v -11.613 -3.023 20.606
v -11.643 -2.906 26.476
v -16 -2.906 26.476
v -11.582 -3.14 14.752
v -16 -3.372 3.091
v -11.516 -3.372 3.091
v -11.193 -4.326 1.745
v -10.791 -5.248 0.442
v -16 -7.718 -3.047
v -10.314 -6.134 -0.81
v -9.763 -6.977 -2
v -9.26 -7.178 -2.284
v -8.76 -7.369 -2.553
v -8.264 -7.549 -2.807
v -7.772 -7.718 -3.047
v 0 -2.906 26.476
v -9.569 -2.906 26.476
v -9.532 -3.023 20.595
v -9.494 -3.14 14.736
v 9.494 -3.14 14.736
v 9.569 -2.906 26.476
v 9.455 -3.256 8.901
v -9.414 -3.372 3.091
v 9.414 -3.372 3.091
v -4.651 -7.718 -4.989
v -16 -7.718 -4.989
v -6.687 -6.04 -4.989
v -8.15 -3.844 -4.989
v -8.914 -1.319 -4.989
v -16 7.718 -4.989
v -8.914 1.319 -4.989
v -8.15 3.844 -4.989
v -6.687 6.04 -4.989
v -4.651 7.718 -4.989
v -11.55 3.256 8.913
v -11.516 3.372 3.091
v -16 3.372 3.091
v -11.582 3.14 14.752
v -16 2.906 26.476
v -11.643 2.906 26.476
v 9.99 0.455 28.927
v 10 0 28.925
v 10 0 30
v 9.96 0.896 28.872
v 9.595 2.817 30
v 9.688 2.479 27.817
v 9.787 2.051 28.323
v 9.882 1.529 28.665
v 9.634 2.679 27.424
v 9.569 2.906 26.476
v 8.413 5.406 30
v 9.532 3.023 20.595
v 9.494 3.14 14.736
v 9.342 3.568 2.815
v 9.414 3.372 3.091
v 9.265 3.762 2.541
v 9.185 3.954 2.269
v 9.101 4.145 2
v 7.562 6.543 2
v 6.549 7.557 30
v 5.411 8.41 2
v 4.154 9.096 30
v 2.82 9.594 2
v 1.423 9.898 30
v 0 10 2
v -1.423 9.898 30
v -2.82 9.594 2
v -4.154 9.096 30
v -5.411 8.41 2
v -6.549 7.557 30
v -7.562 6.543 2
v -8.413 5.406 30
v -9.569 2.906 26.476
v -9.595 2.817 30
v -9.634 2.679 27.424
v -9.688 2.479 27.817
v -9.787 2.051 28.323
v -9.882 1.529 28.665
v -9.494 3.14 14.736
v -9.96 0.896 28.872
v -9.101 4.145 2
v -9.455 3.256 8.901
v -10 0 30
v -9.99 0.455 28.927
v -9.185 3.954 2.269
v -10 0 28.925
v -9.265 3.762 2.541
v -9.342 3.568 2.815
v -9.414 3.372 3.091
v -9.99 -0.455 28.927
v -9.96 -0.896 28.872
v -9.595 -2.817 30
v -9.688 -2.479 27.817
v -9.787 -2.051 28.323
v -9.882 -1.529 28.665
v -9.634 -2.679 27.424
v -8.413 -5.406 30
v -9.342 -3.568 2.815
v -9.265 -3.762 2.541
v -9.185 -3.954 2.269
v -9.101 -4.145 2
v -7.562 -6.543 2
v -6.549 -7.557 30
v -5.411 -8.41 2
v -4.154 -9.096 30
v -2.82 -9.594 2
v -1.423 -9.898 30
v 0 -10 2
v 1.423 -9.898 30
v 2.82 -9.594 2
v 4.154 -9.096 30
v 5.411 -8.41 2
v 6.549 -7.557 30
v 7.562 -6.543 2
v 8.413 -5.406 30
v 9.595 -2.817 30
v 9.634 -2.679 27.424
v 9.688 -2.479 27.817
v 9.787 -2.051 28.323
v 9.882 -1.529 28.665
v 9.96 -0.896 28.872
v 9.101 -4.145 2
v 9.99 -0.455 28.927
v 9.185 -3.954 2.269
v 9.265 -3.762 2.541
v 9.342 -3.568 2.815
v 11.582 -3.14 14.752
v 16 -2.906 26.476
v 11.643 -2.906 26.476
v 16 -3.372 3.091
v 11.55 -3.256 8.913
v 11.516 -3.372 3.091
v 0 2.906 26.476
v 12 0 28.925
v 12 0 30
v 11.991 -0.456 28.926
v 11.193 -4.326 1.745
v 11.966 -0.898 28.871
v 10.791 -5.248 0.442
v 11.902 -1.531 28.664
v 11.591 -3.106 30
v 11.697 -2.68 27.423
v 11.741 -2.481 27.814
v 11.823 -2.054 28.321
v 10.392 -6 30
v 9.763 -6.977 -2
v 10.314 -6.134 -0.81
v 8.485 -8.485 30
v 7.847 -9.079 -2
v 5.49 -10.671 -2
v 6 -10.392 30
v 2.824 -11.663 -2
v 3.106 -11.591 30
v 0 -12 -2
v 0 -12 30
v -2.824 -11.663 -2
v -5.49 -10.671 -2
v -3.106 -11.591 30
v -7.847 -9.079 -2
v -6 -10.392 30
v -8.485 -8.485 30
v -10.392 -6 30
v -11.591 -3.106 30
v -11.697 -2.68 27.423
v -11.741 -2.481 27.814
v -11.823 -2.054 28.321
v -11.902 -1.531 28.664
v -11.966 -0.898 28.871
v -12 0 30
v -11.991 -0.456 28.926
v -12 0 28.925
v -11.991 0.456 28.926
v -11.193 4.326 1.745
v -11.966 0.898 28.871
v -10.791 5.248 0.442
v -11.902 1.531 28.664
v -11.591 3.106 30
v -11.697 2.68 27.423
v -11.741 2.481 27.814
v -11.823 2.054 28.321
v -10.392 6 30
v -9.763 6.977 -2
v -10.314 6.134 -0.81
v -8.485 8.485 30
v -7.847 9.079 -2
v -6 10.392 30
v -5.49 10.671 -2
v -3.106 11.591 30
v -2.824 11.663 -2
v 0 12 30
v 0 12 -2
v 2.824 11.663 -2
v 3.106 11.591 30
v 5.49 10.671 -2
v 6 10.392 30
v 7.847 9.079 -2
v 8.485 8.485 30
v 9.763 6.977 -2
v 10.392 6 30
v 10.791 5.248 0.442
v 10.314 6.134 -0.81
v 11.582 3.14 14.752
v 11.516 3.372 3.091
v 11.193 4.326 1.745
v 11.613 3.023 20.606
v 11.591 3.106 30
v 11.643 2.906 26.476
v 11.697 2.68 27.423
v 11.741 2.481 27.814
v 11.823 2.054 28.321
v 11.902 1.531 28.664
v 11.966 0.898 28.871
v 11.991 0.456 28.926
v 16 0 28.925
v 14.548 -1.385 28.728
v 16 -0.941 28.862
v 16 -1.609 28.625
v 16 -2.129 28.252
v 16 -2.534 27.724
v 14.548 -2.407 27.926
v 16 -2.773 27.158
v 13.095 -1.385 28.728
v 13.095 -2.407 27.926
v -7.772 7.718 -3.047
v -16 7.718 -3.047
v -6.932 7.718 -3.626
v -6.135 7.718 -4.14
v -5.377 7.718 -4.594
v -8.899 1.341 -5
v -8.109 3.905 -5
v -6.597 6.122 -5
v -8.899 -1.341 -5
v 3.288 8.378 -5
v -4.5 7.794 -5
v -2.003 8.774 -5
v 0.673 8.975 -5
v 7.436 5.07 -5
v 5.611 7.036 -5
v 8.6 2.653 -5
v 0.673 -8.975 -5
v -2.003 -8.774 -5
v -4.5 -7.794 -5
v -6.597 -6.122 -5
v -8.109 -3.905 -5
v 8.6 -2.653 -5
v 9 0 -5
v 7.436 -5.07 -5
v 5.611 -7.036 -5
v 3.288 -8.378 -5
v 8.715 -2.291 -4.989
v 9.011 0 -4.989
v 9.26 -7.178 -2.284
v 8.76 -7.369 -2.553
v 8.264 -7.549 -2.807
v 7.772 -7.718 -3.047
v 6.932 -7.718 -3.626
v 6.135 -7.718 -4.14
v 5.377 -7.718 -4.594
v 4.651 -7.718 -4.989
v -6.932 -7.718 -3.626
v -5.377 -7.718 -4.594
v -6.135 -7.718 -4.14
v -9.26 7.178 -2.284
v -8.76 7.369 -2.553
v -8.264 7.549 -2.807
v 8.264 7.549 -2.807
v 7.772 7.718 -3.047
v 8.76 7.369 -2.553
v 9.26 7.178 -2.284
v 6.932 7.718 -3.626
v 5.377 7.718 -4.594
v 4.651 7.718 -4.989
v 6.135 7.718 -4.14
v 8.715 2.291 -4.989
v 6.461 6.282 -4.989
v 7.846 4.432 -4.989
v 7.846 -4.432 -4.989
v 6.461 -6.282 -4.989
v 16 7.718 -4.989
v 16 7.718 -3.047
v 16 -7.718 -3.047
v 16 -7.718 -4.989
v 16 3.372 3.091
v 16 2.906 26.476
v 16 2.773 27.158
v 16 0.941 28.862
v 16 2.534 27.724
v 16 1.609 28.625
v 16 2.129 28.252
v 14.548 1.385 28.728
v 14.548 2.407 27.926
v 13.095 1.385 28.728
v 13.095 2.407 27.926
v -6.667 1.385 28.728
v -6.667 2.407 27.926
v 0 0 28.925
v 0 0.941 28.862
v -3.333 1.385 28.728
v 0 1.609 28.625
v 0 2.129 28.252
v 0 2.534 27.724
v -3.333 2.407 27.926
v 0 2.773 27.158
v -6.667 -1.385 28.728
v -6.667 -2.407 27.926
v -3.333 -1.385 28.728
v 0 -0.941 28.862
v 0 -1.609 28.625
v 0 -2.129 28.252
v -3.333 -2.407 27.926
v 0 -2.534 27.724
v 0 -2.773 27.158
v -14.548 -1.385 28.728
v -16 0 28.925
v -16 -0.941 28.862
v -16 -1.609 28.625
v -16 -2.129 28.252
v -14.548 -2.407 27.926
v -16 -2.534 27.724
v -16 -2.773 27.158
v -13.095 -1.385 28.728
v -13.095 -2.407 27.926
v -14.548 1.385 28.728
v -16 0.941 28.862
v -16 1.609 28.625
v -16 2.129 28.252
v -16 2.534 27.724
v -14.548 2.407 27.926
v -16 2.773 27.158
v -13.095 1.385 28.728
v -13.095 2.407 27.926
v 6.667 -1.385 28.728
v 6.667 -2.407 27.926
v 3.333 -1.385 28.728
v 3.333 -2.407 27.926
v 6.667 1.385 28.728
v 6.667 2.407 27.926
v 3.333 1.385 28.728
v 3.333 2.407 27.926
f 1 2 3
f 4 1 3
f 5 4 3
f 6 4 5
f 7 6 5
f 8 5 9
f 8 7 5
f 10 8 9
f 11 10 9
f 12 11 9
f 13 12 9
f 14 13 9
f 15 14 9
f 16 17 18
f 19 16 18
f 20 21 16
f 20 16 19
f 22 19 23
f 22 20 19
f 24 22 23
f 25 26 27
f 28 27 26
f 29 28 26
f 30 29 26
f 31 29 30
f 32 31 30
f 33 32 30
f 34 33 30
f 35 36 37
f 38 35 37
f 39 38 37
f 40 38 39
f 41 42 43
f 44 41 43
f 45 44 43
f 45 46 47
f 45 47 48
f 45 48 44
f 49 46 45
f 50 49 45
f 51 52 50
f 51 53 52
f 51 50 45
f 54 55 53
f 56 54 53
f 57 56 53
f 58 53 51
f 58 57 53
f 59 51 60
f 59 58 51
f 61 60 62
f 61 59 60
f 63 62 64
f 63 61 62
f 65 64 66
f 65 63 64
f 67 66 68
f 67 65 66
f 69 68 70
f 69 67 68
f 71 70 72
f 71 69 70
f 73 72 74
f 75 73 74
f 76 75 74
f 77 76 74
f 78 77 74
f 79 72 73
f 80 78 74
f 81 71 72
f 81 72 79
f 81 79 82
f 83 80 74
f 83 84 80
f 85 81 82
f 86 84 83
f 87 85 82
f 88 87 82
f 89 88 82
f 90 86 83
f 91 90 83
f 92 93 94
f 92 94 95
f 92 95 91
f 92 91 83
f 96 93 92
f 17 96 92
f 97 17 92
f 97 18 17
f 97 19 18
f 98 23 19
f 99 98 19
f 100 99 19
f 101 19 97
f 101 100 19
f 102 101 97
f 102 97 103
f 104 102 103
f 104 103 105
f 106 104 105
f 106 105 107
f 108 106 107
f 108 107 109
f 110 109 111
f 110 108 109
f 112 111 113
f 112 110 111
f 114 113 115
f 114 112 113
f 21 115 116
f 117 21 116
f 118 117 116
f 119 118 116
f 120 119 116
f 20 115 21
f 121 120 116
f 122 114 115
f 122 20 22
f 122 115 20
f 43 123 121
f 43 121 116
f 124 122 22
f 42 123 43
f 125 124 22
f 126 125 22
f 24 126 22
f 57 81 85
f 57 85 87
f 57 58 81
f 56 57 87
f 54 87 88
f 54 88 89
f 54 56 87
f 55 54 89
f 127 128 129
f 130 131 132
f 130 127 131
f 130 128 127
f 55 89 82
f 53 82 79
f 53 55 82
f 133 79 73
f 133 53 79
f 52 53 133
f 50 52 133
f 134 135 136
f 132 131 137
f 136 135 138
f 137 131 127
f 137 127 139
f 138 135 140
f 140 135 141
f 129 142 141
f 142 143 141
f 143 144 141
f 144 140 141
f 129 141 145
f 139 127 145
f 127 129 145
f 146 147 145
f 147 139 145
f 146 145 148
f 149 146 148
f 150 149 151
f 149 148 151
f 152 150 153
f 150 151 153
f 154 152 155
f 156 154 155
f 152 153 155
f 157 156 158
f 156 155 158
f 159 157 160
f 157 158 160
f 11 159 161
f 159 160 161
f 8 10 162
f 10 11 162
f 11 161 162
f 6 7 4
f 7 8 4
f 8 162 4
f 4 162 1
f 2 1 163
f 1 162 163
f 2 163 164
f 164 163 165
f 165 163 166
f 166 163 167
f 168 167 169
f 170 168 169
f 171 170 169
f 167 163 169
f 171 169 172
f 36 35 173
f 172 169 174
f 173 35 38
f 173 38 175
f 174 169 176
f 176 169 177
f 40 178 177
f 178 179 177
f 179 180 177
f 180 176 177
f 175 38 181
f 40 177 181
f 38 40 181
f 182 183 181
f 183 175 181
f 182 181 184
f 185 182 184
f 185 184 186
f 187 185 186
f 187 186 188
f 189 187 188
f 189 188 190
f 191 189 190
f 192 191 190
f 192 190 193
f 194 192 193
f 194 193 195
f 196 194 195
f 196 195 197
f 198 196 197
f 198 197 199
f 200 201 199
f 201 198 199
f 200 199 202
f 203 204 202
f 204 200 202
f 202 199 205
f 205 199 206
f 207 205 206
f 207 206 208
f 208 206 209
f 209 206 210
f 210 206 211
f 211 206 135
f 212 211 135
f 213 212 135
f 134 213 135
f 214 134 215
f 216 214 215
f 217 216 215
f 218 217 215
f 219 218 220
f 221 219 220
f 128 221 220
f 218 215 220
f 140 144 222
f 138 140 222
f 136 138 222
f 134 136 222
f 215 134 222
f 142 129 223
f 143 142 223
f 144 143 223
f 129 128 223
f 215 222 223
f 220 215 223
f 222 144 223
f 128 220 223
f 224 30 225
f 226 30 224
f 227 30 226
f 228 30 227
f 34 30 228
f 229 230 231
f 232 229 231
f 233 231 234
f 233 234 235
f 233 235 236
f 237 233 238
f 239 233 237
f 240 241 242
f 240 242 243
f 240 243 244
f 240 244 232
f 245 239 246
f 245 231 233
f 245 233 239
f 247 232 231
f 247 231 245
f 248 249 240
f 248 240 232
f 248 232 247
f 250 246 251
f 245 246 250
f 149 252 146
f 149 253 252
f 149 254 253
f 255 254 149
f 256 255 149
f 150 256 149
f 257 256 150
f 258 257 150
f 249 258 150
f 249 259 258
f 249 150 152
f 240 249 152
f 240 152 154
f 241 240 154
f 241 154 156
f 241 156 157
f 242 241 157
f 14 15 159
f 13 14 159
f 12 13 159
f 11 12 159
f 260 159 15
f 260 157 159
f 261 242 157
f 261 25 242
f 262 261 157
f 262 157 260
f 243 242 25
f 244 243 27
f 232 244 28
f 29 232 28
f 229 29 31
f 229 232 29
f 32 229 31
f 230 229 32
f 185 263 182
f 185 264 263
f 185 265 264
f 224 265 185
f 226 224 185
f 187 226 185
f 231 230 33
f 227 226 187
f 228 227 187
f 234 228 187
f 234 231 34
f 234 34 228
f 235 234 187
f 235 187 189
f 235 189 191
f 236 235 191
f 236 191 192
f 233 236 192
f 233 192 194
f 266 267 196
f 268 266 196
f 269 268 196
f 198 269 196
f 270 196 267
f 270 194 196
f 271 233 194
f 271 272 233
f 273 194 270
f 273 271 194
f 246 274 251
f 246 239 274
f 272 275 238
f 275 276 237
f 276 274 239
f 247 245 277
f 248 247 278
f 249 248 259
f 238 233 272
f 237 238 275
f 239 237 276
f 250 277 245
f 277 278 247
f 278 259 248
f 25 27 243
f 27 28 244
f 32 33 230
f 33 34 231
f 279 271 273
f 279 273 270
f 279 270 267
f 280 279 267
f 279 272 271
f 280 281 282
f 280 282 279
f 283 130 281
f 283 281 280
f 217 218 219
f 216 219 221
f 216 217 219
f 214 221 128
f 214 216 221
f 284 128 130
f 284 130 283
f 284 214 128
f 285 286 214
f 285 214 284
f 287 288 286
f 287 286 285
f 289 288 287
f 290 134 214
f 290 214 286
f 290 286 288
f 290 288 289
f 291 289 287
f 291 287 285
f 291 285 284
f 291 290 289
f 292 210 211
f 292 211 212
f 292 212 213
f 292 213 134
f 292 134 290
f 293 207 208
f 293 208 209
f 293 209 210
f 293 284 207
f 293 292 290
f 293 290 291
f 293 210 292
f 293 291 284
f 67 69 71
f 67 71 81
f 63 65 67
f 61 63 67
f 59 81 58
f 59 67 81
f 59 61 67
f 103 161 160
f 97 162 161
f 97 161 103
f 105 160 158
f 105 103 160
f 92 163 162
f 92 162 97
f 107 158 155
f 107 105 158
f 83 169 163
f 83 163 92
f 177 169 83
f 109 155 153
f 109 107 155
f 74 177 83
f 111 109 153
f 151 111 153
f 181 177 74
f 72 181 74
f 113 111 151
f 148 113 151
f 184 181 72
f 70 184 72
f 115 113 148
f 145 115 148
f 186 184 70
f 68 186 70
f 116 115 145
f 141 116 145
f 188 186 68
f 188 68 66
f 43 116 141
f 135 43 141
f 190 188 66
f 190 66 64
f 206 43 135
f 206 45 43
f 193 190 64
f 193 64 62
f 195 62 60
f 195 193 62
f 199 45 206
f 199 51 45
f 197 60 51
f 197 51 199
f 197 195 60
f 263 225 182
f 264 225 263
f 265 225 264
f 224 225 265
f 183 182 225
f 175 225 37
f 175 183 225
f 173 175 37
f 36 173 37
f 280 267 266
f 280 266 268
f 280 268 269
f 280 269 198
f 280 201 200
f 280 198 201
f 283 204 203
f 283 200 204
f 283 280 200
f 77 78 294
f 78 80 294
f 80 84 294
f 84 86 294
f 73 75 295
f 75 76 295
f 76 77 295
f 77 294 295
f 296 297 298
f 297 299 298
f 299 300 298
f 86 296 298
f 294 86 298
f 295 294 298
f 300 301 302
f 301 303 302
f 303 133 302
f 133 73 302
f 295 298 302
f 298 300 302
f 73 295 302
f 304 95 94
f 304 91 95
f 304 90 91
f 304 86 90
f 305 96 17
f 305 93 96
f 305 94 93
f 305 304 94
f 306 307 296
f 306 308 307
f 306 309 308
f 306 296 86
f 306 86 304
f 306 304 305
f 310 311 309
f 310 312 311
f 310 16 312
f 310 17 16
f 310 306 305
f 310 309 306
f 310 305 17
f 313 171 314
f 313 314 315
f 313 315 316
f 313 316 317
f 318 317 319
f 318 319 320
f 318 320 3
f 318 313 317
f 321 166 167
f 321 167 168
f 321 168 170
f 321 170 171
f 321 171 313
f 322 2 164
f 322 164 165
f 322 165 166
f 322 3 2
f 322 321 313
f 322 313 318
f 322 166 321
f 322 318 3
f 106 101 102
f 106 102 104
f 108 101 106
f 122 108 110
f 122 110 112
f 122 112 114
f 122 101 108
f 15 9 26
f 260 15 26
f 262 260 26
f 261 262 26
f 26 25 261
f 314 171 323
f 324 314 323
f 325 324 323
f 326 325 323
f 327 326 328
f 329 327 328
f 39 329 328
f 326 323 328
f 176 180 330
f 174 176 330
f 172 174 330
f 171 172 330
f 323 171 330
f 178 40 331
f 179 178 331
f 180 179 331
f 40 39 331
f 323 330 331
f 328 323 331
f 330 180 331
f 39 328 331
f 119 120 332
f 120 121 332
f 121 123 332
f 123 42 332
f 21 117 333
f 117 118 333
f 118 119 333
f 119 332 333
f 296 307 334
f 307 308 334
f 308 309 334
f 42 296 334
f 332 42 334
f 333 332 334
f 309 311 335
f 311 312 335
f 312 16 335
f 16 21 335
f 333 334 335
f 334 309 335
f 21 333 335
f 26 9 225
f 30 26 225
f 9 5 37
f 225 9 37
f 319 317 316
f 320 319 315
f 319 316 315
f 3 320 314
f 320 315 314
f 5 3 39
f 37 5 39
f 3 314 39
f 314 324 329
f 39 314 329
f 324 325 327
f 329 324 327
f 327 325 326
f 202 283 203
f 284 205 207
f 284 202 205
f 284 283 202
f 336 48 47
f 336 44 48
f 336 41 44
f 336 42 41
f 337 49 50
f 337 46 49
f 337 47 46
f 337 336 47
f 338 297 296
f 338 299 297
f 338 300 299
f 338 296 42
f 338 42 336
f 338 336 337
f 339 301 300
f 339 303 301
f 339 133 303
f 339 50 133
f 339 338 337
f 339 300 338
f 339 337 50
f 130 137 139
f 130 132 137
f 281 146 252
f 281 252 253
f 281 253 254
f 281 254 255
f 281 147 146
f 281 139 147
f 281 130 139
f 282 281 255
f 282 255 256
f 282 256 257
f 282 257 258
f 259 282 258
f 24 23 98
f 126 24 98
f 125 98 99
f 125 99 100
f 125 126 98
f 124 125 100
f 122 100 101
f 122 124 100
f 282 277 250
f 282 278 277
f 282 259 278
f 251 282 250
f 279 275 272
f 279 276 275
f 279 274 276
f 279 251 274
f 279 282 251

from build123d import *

# Parameters (mm, degrees)
F0_R      = 10
F1_DEPTH  = 2
F0_R_2    = 12
F2_DEPTH  = 30
F2_FACE_R = 12
F3_DEPTH  = 5
F4_SIZE   = 3
F6_DEPTH  = 16


with BuildPart() as f1:
    # F0 (on Top) → F1 (new body)
    with BuildSketch(Plane.XY):
        Circle(F0_R)
    extrude(amount=F1_DEPTH)

    # F0 (on Top) → F2 (join)
    with BuildSketch(Plane.XY):
        Circle(F0_R_2)
        Circle(F0_R, mode=Mode.SUBTRACT)
    extrude(amount=F2_DEPTH)

    # F2_face (on face) → F3 (join)
    with BuildSketch(Plane(origin=(0, 0, 0), x_dir=(1, 0, 0), z_dir=(0, 0, -1))):
        Circle(F2_FACE_R)
    extrude(amount=F3_DEPTH)

    # F4
    f4_edges = [f1.edges().sort_by_distance(p)[0] for p in [
        (-12, 0, -5),
    ]]
    chamfer(f4_edges, length=F4_SIZE)

    # F5 (on Right) → F6 (join, symmetric)
    with BuildSketch(Plane.YZ):
        with BuildLine():
            Line((0, -4.988678), (0, 28.925132))
            add(Edge.make_bspline(
                [(0, 28.925132), (-1.5119, 29.017054), (-2.72286, 28.264295), (-2.905796, 26.475869)],
                knots=[0, 0, 0, 0, 3.800334, 3.800334, 3.800334, 3.800334], degree=3))
            Line((-2.905796, 26.475869), (-3.372322, 3.091232))
            Line((-3.372322, 3.091232), (-7.718052, -3.04689))
            Line((-7.718052, -3.04689), (-7.718052, -4.988678))
            Line((-7.718052, -4.988678), (0, -4.988678))
        make_face()
        with BuildLine():
            add(Edge.make_bspline(
                [(0, 28.925132), (1.5119, 29.017054), (2.72286, 28.264295), (2.905796, 26.475869)],
                knots=[0, 0, 0, 0, 3.800334, 3.800334, 3.800334, 3.800334], degree=3))
            Line((0, 28.925132), (0, -4.988678))
            Line((0, -4.988678), (7.718052, -4.988678))
            Line((7.718052, -4.988678), (7.718052, -3.04689))
            Line((7.718052, -3.04689), (3.372322, 3.091232))
            Line((3.372322, 3.091232), (2.905796, 26.475869))
        make_face()
    extrude(amount=F6_DEPTH, both=True)


solid = f1.part
